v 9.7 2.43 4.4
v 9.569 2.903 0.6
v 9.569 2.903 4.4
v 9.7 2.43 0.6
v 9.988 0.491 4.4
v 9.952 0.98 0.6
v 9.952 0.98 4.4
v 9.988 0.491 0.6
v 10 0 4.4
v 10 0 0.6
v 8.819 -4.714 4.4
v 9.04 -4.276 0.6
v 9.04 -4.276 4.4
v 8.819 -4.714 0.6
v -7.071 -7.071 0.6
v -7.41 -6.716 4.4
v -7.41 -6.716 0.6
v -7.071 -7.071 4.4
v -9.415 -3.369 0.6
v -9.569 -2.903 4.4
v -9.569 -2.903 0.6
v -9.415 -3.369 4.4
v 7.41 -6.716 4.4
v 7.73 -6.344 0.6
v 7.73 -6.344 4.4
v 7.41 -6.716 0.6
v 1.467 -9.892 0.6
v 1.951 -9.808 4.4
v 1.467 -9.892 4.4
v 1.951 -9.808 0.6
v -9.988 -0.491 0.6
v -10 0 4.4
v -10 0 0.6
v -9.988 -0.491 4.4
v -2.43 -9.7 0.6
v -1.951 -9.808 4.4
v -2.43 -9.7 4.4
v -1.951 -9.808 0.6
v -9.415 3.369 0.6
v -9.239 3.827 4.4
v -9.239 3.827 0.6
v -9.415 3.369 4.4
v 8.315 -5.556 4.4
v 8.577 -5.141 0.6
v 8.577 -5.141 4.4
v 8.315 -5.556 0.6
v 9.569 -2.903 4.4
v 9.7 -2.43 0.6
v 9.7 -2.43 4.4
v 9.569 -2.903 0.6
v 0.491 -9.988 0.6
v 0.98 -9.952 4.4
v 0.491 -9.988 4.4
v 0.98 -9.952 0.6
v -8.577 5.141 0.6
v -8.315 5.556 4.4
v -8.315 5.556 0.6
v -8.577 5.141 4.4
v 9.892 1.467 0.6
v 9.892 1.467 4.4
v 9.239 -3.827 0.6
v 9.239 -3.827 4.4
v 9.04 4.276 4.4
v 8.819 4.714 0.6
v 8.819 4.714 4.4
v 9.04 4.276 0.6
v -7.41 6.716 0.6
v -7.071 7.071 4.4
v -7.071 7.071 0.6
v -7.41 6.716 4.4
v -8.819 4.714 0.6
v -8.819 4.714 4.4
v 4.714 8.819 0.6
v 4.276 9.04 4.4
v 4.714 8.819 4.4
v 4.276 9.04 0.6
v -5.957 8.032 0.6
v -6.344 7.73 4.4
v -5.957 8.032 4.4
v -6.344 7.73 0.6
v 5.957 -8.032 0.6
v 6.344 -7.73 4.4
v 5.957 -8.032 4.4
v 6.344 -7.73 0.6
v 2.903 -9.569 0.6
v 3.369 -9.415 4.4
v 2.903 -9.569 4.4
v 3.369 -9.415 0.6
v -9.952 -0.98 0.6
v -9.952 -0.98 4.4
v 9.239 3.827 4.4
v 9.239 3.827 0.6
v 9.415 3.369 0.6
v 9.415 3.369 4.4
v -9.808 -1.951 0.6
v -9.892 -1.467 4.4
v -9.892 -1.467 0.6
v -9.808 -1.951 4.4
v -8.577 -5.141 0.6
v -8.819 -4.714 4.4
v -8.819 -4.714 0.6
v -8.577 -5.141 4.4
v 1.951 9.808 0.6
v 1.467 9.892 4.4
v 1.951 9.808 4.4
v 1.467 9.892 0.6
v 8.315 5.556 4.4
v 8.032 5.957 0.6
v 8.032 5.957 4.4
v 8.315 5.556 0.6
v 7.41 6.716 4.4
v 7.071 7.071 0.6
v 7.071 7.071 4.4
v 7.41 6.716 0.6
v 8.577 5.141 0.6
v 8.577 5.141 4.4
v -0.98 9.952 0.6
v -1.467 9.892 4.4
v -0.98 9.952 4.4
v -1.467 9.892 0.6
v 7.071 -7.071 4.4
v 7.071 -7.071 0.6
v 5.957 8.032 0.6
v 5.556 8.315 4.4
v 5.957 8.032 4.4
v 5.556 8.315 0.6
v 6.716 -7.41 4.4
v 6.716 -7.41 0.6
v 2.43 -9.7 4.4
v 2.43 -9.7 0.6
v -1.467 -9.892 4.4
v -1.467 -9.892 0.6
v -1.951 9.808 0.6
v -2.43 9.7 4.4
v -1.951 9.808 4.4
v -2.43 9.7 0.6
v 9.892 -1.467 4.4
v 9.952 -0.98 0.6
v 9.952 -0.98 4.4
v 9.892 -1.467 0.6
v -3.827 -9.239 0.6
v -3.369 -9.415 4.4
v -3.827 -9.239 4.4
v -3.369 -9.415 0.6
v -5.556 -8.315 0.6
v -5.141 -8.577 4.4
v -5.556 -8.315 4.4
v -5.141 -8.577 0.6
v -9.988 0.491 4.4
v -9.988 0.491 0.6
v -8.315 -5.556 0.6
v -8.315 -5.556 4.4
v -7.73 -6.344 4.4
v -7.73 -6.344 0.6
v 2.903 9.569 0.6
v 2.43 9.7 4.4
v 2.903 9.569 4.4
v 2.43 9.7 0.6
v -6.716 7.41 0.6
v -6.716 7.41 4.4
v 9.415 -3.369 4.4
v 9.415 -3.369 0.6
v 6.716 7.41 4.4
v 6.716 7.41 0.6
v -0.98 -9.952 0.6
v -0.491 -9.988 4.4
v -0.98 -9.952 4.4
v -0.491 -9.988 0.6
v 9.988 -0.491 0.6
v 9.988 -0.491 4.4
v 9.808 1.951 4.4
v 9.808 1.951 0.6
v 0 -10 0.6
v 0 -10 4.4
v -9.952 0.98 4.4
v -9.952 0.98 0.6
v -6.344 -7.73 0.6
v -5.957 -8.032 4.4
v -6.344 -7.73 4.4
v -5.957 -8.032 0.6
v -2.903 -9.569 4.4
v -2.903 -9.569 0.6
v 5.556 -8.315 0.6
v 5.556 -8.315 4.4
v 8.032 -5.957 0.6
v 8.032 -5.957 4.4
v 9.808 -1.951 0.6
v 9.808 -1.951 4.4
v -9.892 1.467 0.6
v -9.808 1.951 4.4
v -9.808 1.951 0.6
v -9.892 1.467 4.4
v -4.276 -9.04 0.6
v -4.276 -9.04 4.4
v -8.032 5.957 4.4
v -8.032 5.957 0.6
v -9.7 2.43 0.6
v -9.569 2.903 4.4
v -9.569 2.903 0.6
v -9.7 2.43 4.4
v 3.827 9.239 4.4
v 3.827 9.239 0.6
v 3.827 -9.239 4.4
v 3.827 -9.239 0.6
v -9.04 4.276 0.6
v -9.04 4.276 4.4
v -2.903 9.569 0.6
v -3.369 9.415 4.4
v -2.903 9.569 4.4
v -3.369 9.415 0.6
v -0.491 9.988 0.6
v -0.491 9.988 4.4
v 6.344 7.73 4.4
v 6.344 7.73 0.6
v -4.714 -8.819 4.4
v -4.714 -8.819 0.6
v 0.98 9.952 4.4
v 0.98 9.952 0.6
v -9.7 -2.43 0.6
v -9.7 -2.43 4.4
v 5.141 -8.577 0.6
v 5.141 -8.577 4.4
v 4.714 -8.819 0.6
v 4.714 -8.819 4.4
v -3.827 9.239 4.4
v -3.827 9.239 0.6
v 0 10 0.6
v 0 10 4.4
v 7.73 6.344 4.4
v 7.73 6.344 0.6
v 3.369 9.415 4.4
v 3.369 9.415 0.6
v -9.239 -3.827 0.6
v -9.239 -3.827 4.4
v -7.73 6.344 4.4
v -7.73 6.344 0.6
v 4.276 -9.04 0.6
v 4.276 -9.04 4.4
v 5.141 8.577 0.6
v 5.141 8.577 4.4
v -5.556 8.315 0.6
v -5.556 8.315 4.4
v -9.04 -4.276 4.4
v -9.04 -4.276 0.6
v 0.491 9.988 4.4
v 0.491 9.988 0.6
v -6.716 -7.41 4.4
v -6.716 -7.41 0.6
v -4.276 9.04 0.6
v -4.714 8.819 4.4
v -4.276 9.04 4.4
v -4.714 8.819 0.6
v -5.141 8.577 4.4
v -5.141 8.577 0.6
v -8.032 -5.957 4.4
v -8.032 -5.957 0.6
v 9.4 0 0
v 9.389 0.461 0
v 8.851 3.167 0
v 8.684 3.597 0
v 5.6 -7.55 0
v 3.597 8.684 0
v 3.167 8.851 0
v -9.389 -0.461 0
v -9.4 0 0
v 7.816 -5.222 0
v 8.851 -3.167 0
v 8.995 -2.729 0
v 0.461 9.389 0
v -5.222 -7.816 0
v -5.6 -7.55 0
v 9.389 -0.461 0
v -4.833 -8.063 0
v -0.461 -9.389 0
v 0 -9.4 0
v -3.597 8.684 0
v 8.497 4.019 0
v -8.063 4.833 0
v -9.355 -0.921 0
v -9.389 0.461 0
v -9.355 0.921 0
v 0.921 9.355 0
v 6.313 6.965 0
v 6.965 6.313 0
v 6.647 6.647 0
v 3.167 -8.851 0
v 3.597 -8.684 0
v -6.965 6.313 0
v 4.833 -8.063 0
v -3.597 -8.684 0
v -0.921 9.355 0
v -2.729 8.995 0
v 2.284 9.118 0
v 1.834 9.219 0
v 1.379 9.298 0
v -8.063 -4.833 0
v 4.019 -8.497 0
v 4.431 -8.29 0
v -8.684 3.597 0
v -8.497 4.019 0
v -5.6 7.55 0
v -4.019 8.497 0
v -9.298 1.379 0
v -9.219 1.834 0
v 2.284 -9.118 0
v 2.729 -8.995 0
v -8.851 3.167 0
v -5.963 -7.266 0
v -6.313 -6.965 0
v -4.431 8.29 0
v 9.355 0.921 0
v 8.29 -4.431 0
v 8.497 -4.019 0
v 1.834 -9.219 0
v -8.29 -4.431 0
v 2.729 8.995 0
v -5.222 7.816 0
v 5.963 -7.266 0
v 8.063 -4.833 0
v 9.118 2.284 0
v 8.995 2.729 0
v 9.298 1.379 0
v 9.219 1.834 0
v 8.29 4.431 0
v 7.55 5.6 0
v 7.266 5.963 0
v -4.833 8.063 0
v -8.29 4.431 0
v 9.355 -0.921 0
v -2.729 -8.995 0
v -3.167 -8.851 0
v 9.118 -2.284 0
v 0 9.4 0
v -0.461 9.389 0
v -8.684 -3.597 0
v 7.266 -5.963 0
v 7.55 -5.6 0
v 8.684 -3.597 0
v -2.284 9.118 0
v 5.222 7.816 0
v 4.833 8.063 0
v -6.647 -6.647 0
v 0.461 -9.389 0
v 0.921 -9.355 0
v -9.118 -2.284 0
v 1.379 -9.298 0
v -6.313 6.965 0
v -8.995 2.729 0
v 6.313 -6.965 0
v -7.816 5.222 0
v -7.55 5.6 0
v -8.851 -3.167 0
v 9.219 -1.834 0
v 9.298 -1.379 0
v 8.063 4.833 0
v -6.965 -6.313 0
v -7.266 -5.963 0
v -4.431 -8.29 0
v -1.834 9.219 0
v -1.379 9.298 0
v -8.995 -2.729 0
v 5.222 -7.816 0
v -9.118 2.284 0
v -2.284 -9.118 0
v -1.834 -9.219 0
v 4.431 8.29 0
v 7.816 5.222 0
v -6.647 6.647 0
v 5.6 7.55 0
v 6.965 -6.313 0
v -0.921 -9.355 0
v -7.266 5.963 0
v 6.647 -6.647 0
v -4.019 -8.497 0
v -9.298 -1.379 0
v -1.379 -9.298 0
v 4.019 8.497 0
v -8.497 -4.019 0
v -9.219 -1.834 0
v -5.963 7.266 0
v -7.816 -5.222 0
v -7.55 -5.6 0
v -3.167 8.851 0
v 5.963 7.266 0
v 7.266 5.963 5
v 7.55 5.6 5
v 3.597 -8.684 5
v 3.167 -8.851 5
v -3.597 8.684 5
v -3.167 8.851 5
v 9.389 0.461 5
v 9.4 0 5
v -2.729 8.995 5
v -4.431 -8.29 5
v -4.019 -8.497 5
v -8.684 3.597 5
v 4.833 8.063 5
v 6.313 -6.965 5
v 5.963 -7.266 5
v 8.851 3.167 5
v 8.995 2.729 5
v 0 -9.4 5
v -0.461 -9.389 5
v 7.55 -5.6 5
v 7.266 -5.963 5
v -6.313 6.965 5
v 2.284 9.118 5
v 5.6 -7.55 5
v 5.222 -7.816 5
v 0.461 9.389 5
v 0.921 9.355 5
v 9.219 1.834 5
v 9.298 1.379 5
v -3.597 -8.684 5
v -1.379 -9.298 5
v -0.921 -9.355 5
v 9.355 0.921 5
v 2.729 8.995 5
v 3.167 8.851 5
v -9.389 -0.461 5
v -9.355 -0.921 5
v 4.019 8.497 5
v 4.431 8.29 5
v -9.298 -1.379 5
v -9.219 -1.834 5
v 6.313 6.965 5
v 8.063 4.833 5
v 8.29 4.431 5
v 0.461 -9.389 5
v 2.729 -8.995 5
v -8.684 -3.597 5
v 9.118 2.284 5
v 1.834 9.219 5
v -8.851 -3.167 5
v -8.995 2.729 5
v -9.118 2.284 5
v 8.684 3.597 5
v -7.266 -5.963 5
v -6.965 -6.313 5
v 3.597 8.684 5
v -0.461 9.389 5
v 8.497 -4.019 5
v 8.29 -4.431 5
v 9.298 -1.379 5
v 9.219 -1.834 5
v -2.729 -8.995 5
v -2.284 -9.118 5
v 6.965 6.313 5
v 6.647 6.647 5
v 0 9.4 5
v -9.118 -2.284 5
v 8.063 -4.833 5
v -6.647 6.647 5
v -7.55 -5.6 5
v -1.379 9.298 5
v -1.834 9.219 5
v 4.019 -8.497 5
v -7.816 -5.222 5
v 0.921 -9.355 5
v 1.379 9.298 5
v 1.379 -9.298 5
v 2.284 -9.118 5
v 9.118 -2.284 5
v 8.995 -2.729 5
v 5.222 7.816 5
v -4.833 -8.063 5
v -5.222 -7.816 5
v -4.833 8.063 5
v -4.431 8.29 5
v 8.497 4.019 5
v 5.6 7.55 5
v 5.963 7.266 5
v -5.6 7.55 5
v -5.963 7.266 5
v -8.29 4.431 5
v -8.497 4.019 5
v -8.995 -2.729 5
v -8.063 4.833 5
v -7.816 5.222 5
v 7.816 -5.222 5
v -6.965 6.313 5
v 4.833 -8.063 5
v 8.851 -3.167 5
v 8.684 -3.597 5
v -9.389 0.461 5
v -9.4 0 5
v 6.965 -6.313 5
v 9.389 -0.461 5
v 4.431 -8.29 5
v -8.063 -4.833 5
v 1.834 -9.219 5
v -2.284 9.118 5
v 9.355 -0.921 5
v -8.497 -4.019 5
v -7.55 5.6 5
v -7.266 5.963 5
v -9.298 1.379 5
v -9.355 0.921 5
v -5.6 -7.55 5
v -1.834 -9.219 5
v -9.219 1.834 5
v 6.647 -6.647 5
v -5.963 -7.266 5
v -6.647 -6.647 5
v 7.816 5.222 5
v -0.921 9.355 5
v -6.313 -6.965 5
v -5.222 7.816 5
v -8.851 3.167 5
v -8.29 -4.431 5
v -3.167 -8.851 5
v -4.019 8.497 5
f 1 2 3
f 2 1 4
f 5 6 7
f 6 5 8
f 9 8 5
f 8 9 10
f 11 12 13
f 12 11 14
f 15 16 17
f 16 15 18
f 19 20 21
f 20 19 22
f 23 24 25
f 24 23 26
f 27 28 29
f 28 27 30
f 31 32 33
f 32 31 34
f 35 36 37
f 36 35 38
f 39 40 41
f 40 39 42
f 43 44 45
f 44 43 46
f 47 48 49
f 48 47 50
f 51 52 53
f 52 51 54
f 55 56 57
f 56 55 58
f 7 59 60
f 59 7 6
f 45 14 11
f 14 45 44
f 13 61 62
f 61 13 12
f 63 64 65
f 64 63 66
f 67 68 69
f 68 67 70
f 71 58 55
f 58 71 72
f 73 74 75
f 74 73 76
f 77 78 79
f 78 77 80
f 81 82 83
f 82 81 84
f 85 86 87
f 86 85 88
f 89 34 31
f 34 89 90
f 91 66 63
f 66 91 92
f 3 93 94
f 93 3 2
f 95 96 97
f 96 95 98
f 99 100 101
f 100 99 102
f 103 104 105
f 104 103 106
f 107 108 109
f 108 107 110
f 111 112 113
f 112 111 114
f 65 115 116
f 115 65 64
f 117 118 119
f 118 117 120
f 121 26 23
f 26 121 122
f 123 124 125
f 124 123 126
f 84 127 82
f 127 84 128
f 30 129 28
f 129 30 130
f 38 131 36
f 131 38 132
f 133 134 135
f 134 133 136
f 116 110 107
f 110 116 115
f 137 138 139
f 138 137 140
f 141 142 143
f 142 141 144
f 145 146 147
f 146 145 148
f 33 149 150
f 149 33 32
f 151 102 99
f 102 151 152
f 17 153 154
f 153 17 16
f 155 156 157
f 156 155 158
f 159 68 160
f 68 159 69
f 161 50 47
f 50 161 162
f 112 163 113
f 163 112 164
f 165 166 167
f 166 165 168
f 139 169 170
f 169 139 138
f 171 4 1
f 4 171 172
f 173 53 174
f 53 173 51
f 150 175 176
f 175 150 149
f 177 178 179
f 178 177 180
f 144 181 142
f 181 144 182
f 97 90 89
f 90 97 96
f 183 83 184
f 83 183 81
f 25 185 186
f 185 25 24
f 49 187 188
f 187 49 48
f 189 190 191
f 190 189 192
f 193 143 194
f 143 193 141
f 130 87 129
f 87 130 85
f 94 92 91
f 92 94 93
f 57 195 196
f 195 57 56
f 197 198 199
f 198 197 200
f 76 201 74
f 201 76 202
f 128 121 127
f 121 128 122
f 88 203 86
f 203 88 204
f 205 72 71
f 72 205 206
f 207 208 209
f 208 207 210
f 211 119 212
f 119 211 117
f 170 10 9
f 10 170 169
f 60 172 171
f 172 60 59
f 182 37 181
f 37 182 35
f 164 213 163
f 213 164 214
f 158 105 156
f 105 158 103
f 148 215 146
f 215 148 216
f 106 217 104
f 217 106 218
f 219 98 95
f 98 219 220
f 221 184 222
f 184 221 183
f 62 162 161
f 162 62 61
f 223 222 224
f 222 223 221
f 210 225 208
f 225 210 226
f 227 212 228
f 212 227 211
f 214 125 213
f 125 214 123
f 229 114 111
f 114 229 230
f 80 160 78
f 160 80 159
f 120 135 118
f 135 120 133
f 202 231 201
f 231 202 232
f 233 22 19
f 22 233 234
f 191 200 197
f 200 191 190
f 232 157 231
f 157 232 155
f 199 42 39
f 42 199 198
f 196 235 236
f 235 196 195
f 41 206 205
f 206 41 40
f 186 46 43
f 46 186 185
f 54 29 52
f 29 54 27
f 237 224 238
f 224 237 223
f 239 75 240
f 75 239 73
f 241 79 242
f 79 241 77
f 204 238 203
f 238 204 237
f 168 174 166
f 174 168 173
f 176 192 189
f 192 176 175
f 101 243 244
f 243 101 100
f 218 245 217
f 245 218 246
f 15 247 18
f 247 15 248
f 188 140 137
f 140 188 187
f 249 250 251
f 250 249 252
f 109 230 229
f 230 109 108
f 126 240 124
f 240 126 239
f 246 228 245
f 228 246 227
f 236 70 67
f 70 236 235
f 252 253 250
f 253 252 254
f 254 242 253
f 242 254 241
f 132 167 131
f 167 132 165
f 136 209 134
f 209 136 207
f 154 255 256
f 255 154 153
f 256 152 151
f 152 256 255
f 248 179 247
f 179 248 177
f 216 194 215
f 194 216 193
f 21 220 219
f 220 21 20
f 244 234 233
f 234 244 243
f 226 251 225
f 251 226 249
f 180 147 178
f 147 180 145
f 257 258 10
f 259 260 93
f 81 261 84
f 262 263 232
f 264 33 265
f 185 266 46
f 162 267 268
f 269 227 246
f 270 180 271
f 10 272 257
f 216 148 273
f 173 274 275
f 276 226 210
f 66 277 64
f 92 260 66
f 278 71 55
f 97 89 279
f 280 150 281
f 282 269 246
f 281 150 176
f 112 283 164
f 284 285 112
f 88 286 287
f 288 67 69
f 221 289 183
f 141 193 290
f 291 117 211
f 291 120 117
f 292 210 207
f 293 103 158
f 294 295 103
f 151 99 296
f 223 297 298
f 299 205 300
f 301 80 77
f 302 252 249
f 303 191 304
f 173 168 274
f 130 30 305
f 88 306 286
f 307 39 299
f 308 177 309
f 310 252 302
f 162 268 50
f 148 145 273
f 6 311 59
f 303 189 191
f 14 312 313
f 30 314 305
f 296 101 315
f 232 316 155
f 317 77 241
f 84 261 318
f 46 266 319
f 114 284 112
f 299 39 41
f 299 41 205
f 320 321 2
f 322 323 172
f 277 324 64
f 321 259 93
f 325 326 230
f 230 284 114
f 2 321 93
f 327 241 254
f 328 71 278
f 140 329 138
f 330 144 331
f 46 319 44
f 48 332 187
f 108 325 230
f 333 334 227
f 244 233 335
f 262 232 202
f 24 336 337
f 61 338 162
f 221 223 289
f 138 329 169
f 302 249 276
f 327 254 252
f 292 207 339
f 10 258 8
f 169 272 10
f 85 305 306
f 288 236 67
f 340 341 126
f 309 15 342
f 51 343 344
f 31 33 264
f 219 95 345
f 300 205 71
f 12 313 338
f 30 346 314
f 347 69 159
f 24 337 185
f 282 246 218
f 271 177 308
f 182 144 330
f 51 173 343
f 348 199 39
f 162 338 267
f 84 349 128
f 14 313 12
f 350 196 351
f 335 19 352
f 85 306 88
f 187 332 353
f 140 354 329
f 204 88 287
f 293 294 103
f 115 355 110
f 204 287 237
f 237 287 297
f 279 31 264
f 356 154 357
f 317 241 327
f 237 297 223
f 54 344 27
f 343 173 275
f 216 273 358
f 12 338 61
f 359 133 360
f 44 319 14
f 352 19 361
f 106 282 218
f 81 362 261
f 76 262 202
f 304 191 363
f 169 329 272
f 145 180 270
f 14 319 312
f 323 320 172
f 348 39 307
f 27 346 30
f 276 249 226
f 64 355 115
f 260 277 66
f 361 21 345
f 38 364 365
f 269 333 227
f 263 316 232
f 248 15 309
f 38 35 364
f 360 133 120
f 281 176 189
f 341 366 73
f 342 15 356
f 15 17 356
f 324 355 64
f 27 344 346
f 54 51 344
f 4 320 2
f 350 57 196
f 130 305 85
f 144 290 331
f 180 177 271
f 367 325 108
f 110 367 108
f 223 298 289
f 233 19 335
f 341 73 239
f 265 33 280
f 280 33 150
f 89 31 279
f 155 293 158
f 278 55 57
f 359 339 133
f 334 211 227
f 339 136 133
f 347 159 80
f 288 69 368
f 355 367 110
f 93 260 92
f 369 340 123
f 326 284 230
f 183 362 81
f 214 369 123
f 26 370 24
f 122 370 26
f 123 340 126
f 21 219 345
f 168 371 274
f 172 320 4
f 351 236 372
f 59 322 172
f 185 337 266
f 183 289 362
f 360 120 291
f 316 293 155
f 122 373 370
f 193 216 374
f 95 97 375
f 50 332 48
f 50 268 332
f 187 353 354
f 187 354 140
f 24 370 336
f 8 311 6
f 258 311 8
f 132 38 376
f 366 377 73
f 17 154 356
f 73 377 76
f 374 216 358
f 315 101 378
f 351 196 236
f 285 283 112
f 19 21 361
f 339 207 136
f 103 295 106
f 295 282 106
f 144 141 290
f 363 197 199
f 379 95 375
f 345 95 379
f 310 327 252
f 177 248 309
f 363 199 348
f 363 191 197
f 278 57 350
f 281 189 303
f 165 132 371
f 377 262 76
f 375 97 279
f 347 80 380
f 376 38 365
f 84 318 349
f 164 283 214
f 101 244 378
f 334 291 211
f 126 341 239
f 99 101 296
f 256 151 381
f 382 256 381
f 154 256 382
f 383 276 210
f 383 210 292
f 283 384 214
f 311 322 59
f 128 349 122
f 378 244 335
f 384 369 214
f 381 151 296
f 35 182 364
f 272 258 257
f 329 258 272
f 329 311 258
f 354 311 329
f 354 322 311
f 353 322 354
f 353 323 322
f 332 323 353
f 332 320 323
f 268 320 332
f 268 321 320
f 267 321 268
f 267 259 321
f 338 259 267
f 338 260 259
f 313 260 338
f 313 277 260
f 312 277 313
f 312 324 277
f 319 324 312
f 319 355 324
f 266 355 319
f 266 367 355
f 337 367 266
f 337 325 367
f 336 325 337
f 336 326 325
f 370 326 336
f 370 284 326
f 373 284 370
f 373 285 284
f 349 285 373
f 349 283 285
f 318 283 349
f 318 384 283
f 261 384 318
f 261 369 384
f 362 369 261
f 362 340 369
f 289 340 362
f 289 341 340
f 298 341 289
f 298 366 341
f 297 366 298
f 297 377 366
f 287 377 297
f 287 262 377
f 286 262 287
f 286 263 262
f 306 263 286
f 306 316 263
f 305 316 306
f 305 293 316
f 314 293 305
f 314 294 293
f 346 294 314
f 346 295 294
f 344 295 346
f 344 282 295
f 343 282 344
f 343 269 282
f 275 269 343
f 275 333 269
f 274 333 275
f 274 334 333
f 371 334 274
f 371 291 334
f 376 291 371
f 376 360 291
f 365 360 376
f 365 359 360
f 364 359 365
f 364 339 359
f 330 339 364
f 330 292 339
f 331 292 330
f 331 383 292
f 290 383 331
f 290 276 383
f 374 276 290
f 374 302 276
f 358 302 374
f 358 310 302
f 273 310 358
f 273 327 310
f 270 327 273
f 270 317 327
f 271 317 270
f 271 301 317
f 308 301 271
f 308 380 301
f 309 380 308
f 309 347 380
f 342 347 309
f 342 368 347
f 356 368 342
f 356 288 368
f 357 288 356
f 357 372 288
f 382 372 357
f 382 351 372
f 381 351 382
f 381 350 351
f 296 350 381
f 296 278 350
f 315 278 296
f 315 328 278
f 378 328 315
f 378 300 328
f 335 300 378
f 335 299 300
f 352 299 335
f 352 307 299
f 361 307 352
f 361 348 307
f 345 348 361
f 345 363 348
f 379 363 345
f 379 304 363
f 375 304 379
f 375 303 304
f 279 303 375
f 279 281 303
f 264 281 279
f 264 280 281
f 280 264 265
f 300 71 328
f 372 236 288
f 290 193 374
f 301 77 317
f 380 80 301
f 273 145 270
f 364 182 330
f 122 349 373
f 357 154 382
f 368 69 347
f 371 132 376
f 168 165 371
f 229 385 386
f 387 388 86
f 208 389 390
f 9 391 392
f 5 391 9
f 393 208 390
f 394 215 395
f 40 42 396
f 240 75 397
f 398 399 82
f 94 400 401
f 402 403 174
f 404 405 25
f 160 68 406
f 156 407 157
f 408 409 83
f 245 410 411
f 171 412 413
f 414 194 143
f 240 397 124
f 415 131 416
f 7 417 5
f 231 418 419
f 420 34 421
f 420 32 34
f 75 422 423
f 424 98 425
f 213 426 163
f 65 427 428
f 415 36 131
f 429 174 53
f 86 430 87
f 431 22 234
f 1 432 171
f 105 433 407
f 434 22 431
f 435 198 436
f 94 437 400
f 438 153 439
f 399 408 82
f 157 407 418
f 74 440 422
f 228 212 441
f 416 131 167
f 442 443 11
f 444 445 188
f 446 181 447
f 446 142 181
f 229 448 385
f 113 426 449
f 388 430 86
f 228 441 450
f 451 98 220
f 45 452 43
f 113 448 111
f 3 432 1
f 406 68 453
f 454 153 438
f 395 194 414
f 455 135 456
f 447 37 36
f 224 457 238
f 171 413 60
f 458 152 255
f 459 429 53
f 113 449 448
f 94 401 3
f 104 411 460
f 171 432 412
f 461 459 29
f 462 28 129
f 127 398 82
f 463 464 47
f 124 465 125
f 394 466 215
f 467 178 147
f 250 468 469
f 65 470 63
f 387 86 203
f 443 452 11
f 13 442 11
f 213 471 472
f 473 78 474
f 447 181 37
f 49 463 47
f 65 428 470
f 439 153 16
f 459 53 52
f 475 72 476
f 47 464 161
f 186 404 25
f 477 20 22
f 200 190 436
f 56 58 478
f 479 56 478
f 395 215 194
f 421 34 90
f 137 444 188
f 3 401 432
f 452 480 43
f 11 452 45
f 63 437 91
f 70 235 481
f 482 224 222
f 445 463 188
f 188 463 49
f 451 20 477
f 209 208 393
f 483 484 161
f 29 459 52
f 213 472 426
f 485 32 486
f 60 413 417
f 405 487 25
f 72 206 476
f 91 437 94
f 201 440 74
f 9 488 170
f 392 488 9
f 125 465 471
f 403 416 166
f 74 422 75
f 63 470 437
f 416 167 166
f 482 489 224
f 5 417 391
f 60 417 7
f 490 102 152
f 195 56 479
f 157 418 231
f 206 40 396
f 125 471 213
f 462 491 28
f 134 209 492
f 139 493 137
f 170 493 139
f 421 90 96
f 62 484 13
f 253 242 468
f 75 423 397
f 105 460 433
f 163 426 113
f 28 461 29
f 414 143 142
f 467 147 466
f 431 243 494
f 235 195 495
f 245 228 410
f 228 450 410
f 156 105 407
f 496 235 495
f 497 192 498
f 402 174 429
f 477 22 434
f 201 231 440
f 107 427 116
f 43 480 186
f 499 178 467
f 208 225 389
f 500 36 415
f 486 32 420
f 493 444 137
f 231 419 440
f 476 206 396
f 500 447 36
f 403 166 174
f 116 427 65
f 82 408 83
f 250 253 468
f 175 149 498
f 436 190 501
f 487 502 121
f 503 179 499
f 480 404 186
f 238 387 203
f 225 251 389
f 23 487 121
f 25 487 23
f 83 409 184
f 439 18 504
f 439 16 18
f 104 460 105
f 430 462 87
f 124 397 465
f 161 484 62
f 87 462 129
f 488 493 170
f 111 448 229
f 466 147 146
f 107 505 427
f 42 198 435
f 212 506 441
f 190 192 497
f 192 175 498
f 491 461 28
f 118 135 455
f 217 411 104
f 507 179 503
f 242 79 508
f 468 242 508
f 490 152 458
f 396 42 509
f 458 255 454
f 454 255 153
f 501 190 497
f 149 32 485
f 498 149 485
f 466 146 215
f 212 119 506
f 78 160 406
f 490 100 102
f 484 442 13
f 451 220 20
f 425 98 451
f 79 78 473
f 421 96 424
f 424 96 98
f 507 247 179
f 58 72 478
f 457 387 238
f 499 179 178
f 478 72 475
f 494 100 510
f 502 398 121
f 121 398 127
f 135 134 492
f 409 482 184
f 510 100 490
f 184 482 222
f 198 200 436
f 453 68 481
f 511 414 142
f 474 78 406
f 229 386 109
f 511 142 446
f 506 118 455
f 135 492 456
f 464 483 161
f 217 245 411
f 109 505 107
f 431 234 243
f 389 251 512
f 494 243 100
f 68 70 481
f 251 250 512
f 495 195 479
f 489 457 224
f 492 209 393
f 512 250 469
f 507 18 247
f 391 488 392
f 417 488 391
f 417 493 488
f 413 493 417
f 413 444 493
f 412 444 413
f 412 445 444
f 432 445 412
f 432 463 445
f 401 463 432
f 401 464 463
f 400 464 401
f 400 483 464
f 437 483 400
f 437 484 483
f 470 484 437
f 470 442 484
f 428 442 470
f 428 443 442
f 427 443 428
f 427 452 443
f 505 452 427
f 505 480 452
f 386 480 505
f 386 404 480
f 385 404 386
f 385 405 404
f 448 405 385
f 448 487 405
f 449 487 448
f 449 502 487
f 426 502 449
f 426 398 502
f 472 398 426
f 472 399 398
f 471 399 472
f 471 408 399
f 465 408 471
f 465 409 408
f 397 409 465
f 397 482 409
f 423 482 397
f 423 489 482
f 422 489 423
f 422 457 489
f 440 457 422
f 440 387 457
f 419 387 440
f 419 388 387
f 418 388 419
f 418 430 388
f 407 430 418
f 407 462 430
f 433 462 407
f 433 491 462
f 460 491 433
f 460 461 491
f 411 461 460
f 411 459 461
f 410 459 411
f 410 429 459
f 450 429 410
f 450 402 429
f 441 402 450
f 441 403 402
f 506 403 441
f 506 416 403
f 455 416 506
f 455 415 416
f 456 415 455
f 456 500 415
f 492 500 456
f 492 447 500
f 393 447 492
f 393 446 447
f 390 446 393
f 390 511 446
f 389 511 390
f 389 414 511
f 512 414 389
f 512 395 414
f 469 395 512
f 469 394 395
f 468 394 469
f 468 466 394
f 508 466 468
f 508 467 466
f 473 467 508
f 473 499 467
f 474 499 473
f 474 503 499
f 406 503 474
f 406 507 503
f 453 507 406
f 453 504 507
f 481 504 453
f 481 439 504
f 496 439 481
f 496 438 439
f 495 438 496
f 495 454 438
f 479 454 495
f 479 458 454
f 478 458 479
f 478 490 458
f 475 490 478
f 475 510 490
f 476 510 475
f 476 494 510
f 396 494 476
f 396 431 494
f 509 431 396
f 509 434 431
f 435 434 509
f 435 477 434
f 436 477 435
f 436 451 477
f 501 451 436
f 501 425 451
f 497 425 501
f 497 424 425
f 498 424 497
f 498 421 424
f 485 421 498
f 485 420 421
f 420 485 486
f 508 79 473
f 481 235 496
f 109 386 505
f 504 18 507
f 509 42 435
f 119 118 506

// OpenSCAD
$fn = 128;

magnet_d = 20;
magnet_h = 5;
edge_chamfer = 0.6;

module chamfered_cylinder(d=20, h=5, c=0.6) {
    c = min(c, h/2 - 0.001, d/4);
    if (c <= 0) {
        cylinder(d=d, h=h);
    } else {
        union() {
            translate([0,0,c])
                cylinder(d=d, h=h-2*c);
            cylinder(h=c, d1=d-2*c, d2=d);
            translate([0,0,h-c])
                cylinder(h=c, d1=d, d2=d-2*c);
        }
    }
}

chamfered_cylinder(d=magnet_d, h=magnet_h, c=edge_chamfer);
